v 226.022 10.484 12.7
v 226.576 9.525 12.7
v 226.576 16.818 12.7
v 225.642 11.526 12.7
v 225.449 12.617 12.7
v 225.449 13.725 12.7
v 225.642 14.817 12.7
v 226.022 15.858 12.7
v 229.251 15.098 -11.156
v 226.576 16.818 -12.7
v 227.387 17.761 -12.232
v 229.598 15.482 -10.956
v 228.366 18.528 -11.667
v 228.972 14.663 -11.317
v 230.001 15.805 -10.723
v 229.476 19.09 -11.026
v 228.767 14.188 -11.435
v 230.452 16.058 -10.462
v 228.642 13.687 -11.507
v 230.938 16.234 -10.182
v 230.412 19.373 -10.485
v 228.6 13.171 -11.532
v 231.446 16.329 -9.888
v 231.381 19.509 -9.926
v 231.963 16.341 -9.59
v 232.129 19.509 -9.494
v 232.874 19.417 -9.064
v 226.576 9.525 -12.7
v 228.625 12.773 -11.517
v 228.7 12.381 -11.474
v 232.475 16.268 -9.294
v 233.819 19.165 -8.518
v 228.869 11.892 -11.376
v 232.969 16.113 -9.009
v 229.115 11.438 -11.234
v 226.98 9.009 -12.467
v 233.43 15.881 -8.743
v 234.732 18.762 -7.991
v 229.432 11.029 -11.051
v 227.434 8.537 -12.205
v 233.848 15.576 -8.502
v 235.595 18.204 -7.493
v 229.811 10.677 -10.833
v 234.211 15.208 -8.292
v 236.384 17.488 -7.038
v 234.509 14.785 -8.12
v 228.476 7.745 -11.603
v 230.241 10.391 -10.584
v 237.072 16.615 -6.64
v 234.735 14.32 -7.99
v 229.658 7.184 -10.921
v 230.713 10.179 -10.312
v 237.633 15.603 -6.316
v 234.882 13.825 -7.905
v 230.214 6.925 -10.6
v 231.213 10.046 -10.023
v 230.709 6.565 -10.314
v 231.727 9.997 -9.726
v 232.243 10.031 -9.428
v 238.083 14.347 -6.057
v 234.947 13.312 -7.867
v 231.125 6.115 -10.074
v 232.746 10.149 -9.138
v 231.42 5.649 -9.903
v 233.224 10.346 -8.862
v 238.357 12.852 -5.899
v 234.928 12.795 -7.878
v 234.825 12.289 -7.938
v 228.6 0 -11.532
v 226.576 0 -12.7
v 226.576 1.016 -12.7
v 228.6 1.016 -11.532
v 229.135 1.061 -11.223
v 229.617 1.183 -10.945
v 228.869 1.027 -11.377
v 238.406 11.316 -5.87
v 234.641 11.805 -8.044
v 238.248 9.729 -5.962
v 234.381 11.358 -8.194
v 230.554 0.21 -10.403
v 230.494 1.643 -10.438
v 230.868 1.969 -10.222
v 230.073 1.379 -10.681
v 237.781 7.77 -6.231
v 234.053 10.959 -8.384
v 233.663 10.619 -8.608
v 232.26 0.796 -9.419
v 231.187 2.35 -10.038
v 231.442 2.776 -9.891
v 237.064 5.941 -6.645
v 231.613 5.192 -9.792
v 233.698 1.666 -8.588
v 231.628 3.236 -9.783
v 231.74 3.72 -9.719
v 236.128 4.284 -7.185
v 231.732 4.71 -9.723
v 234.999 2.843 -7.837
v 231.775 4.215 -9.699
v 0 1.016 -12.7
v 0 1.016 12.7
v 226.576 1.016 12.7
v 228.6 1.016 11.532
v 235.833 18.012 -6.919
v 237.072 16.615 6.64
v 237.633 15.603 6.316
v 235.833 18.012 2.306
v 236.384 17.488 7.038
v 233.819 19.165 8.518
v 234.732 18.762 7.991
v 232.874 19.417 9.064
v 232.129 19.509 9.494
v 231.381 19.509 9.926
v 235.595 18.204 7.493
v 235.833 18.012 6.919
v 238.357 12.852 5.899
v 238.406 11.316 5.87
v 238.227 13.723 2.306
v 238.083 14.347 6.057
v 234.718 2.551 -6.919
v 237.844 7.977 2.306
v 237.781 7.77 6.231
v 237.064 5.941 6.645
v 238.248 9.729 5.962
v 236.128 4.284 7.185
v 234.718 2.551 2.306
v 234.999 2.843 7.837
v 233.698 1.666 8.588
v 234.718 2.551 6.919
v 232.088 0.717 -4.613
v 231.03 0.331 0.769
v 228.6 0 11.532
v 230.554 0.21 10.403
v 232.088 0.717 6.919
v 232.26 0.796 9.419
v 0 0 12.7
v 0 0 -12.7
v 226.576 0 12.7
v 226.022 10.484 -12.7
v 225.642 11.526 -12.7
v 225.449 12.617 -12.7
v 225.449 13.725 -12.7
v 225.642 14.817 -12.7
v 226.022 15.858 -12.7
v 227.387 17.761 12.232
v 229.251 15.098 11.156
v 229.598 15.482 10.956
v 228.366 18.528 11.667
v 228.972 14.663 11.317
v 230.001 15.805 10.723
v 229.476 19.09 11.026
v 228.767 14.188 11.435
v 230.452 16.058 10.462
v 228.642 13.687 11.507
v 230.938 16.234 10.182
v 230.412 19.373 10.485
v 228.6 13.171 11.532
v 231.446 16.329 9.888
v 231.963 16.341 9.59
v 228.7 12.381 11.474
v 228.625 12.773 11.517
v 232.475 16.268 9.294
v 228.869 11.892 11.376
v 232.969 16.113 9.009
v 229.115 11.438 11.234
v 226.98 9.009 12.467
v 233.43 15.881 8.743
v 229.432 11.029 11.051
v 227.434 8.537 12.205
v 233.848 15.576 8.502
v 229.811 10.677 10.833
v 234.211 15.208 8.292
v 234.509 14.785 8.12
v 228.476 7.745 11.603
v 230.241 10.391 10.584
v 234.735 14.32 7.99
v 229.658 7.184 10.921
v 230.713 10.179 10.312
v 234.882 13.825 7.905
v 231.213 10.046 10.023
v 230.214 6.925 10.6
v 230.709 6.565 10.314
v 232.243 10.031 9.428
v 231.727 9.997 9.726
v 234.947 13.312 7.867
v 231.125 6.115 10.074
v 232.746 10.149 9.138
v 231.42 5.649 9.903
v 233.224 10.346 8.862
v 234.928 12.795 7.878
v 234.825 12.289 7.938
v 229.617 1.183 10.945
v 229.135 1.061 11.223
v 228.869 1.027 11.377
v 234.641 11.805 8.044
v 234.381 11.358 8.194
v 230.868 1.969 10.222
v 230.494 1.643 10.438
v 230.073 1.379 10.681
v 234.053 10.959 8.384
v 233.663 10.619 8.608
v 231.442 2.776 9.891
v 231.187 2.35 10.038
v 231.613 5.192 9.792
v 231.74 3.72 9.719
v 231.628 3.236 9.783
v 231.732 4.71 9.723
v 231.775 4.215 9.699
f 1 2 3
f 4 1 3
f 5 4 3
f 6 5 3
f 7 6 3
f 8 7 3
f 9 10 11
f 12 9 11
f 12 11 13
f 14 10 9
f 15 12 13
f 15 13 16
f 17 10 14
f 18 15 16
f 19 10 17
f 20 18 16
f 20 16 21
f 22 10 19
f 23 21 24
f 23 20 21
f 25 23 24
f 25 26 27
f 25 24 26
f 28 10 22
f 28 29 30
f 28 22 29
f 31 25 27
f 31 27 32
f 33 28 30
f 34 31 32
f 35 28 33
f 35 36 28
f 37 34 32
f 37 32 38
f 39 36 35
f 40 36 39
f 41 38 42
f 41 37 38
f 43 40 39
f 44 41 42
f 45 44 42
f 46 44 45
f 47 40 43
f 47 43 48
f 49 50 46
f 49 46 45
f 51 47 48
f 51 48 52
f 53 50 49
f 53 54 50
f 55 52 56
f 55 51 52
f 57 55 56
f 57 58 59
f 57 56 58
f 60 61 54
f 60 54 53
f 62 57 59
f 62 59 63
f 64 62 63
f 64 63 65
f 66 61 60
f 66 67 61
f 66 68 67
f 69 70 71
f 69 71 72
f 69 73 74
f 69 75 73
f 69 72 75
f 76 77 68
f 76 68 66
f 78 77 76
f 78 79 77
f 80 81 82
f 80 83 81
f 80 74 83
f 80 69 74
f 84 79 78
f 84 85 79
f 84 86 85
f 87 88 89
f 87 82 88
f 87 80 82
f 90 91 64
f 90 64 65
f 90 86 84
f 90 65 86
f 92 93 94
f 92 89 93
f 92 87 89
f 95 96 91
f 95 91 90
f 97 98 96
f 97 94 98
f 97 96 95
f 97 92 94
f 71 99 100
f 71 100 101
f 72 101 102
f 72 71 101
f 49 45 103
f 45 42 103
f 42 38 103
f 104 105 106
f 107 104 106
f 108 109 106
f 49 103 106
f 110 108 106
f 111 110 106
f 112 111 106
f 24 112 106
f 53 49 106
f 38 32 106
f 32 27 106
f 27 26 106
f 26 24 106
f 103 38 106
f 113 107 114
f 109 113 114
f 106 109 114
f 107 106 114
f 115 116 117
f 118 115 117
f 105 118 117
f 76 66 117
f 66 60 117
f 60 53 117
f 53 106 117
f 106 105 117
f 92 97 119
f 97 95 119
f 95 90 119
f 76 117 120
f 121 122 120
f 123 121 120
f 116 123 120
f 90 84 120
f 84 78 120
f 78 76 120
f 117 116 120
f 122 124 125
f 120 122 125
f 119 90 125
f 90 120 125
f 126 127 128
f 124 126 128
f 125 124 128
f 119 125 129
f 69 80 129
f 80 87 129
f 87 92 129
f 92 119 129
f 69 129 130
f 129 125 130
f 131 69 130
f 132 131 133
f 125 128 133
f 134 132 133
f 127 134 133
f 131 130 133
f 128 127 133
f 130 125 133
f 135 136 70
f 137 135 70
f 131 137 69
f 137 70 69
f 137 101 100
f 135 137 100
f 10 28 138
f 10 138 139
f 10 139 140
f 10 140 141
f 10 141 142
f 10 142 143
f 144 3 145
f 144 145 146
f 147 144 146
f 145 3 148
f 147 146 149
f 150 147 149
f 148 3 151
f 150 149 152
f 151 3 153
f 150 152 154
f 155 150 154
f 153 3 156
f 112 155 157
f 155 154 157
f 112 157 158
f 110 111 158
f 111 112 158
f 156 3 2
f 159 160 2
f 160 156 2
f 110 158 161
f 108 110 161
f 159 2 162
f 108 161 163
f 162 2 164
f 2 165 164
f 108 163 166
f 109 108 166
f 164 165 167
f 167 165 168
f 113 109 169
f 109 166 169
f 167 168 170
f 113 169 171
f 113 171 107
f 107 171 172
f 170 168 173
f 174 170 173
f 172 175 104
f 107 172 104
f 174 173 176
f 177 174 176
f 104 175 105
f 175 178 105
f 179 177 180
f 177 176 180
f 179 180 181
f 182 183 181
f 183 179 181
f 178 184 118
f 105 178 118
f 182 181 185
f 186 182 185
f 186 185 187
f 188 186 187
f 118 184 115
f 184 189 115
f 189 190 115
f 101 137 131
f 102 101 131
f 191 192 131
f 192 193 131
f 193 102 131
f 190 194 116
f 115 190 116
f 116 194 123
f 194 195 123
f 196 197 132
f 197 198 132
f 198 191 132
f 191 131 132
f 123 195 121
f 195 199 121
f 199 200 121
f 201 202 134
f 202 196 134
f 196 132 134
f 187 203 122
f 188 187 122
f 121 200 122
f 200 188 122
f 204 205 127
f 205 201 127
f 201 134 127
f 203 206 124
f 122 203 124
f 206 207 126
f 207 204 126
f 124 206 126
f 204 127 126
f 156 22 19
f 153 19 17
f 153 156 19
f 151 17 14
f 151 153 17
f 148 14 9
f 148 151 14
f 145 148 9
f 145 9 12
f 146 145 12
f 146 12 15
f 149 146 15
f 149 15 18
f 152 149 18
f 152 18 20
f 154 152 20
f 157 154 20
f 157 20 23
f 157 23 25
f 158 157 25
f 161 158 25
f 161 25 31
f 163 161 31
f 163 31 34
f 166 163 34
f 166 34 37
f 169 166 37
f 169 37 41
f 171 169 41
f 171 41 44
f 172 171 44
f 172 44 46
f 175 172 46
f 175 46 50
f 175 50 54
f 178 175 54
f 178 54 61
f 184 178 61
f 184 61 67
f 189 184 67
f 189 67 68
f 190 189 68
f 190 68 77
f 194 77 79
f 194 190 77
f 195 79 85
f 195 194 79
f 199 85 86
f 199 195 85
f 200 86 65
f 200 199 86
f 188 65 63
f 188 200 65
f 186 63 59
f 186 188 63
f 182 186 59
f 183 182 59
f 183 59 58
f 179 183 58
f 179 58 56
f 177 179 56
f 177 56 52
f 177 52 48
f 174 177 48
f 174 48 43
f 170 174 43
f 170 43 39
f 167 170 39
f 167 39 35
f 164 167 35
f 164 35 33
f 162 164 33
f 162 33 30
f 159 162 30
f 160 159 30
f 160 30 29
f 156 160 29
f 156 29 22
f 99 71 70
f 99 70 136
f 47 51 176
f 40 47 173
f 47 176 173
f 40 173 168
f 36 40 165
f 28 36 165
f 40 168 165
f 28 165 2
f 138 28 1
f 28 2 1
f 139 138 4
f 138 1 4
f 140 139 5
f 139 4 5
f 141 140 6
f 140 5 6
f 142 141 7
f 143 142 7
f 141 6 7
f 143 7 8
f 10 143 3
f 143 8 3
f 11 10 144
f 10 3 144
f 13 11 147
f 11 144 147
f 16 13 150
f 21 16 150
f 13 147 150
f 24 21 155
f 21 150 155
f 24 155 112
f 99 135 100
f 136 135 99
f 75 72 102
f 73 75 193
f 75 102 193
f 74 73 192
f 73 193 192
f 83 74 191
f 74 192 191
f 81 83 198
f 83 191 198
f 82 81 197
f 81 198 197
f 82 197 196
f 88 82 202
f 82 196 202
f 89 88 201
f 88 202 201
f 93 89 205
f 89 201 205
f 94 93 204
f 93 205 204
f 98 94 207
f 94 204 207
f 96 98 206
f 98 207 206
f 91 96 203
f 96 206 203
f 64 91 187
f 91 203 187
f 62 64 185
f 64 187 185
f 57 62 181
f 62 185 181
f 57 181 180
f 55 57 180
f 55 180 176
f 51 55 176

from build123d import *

# Parameters (mm, degrees)
SKETCH1_W               = 228.6
SKETCH1_H               = 25.4
BOSS_EXTRUDE1_DEPTH     = 1.016
BOSS_EXTRUDE2_START     = -25.4
BOSS_EXTRUDE2_OUTLINE_R = 3.175
BOSS_EXTRUDE2_DEPTH     = 25.4
CUT_EXTRUDE2_DEPTH      = 240.548137597


# Read off the part's stored shape, not the designer's step: Boss-Extrude2
with BuildPart() as part:
    # Sketch1 → Boss-Extrude1 (new body)
    with BuildSketch(Plane(origin=(0, 0, 0), x_dir=(1, 0, 0), z_dir=(0, 1, 0))):
        with Locations((114.3, 0)):
            Rectangle(SKETCH1_W, SKETCH1_H)
    extrude(amount=BOSS_EXTRUDE1_DEPTH)

    # Boss-Extrude2 outline → Boss-Extrude2 (add)
    with BuildSketch(Plane(origin=(0, 0, -12.7), x_dir=(-1, 0, 0), z_dir=(0, 0, -1)).offset(BOSS_EXTRUDE2_START)):
        with BuildLine():
            ThreePointArc((-229.658333333, 7.184418707), (-225.486151946, 14.050397837), (-231.381237899, 19.509035812))
            add(Edge.make_bspline(
                [(-231.381237899, 19.509035812), (-236.227087861, 19.810105296), (-241.340763982, 15.106028372), (-239.097965647, 8.031629833), (-236.573095563, 0), (-228.6, 0)],
                knots=[0, 0, 0, 0, 0, 0, 1, 1, 1, 1, 1, 1], degree=5))
            Line((-228.6, 0), (-228.6, 1.016))
            ThreePointArc((-228.6, 1.016), (-231.729275427, 3.654101218), (-229.658333333, 7.184418707))
        make_face()
        with Locations((-231.775, 13.171256121)):
            Circle(BOSS_EXTRUDE2_OUTLINE_R, mode=Mode.SUBTRACT)
    extrude(amount=BOSS_EXTRUDE2_DEPTH)

    # Sketch3 → Cut-Extrude2 (cut, through all)
    with BuildSketch(Plane.XZ):
        Polygon((226.576403153, 12.7), (238.413448409, 5.865878735), (238.413448409, 12.7), align=None)
        Polygon((226.576403153, -12.7), (238.413448409, -5.865878735), (238.413448409, -12.7), align=None)
    extrude(amount=-CUT_EXTRUDE2_DEPTH, mode=Mode.SUBTRACT)


solid = part.part
